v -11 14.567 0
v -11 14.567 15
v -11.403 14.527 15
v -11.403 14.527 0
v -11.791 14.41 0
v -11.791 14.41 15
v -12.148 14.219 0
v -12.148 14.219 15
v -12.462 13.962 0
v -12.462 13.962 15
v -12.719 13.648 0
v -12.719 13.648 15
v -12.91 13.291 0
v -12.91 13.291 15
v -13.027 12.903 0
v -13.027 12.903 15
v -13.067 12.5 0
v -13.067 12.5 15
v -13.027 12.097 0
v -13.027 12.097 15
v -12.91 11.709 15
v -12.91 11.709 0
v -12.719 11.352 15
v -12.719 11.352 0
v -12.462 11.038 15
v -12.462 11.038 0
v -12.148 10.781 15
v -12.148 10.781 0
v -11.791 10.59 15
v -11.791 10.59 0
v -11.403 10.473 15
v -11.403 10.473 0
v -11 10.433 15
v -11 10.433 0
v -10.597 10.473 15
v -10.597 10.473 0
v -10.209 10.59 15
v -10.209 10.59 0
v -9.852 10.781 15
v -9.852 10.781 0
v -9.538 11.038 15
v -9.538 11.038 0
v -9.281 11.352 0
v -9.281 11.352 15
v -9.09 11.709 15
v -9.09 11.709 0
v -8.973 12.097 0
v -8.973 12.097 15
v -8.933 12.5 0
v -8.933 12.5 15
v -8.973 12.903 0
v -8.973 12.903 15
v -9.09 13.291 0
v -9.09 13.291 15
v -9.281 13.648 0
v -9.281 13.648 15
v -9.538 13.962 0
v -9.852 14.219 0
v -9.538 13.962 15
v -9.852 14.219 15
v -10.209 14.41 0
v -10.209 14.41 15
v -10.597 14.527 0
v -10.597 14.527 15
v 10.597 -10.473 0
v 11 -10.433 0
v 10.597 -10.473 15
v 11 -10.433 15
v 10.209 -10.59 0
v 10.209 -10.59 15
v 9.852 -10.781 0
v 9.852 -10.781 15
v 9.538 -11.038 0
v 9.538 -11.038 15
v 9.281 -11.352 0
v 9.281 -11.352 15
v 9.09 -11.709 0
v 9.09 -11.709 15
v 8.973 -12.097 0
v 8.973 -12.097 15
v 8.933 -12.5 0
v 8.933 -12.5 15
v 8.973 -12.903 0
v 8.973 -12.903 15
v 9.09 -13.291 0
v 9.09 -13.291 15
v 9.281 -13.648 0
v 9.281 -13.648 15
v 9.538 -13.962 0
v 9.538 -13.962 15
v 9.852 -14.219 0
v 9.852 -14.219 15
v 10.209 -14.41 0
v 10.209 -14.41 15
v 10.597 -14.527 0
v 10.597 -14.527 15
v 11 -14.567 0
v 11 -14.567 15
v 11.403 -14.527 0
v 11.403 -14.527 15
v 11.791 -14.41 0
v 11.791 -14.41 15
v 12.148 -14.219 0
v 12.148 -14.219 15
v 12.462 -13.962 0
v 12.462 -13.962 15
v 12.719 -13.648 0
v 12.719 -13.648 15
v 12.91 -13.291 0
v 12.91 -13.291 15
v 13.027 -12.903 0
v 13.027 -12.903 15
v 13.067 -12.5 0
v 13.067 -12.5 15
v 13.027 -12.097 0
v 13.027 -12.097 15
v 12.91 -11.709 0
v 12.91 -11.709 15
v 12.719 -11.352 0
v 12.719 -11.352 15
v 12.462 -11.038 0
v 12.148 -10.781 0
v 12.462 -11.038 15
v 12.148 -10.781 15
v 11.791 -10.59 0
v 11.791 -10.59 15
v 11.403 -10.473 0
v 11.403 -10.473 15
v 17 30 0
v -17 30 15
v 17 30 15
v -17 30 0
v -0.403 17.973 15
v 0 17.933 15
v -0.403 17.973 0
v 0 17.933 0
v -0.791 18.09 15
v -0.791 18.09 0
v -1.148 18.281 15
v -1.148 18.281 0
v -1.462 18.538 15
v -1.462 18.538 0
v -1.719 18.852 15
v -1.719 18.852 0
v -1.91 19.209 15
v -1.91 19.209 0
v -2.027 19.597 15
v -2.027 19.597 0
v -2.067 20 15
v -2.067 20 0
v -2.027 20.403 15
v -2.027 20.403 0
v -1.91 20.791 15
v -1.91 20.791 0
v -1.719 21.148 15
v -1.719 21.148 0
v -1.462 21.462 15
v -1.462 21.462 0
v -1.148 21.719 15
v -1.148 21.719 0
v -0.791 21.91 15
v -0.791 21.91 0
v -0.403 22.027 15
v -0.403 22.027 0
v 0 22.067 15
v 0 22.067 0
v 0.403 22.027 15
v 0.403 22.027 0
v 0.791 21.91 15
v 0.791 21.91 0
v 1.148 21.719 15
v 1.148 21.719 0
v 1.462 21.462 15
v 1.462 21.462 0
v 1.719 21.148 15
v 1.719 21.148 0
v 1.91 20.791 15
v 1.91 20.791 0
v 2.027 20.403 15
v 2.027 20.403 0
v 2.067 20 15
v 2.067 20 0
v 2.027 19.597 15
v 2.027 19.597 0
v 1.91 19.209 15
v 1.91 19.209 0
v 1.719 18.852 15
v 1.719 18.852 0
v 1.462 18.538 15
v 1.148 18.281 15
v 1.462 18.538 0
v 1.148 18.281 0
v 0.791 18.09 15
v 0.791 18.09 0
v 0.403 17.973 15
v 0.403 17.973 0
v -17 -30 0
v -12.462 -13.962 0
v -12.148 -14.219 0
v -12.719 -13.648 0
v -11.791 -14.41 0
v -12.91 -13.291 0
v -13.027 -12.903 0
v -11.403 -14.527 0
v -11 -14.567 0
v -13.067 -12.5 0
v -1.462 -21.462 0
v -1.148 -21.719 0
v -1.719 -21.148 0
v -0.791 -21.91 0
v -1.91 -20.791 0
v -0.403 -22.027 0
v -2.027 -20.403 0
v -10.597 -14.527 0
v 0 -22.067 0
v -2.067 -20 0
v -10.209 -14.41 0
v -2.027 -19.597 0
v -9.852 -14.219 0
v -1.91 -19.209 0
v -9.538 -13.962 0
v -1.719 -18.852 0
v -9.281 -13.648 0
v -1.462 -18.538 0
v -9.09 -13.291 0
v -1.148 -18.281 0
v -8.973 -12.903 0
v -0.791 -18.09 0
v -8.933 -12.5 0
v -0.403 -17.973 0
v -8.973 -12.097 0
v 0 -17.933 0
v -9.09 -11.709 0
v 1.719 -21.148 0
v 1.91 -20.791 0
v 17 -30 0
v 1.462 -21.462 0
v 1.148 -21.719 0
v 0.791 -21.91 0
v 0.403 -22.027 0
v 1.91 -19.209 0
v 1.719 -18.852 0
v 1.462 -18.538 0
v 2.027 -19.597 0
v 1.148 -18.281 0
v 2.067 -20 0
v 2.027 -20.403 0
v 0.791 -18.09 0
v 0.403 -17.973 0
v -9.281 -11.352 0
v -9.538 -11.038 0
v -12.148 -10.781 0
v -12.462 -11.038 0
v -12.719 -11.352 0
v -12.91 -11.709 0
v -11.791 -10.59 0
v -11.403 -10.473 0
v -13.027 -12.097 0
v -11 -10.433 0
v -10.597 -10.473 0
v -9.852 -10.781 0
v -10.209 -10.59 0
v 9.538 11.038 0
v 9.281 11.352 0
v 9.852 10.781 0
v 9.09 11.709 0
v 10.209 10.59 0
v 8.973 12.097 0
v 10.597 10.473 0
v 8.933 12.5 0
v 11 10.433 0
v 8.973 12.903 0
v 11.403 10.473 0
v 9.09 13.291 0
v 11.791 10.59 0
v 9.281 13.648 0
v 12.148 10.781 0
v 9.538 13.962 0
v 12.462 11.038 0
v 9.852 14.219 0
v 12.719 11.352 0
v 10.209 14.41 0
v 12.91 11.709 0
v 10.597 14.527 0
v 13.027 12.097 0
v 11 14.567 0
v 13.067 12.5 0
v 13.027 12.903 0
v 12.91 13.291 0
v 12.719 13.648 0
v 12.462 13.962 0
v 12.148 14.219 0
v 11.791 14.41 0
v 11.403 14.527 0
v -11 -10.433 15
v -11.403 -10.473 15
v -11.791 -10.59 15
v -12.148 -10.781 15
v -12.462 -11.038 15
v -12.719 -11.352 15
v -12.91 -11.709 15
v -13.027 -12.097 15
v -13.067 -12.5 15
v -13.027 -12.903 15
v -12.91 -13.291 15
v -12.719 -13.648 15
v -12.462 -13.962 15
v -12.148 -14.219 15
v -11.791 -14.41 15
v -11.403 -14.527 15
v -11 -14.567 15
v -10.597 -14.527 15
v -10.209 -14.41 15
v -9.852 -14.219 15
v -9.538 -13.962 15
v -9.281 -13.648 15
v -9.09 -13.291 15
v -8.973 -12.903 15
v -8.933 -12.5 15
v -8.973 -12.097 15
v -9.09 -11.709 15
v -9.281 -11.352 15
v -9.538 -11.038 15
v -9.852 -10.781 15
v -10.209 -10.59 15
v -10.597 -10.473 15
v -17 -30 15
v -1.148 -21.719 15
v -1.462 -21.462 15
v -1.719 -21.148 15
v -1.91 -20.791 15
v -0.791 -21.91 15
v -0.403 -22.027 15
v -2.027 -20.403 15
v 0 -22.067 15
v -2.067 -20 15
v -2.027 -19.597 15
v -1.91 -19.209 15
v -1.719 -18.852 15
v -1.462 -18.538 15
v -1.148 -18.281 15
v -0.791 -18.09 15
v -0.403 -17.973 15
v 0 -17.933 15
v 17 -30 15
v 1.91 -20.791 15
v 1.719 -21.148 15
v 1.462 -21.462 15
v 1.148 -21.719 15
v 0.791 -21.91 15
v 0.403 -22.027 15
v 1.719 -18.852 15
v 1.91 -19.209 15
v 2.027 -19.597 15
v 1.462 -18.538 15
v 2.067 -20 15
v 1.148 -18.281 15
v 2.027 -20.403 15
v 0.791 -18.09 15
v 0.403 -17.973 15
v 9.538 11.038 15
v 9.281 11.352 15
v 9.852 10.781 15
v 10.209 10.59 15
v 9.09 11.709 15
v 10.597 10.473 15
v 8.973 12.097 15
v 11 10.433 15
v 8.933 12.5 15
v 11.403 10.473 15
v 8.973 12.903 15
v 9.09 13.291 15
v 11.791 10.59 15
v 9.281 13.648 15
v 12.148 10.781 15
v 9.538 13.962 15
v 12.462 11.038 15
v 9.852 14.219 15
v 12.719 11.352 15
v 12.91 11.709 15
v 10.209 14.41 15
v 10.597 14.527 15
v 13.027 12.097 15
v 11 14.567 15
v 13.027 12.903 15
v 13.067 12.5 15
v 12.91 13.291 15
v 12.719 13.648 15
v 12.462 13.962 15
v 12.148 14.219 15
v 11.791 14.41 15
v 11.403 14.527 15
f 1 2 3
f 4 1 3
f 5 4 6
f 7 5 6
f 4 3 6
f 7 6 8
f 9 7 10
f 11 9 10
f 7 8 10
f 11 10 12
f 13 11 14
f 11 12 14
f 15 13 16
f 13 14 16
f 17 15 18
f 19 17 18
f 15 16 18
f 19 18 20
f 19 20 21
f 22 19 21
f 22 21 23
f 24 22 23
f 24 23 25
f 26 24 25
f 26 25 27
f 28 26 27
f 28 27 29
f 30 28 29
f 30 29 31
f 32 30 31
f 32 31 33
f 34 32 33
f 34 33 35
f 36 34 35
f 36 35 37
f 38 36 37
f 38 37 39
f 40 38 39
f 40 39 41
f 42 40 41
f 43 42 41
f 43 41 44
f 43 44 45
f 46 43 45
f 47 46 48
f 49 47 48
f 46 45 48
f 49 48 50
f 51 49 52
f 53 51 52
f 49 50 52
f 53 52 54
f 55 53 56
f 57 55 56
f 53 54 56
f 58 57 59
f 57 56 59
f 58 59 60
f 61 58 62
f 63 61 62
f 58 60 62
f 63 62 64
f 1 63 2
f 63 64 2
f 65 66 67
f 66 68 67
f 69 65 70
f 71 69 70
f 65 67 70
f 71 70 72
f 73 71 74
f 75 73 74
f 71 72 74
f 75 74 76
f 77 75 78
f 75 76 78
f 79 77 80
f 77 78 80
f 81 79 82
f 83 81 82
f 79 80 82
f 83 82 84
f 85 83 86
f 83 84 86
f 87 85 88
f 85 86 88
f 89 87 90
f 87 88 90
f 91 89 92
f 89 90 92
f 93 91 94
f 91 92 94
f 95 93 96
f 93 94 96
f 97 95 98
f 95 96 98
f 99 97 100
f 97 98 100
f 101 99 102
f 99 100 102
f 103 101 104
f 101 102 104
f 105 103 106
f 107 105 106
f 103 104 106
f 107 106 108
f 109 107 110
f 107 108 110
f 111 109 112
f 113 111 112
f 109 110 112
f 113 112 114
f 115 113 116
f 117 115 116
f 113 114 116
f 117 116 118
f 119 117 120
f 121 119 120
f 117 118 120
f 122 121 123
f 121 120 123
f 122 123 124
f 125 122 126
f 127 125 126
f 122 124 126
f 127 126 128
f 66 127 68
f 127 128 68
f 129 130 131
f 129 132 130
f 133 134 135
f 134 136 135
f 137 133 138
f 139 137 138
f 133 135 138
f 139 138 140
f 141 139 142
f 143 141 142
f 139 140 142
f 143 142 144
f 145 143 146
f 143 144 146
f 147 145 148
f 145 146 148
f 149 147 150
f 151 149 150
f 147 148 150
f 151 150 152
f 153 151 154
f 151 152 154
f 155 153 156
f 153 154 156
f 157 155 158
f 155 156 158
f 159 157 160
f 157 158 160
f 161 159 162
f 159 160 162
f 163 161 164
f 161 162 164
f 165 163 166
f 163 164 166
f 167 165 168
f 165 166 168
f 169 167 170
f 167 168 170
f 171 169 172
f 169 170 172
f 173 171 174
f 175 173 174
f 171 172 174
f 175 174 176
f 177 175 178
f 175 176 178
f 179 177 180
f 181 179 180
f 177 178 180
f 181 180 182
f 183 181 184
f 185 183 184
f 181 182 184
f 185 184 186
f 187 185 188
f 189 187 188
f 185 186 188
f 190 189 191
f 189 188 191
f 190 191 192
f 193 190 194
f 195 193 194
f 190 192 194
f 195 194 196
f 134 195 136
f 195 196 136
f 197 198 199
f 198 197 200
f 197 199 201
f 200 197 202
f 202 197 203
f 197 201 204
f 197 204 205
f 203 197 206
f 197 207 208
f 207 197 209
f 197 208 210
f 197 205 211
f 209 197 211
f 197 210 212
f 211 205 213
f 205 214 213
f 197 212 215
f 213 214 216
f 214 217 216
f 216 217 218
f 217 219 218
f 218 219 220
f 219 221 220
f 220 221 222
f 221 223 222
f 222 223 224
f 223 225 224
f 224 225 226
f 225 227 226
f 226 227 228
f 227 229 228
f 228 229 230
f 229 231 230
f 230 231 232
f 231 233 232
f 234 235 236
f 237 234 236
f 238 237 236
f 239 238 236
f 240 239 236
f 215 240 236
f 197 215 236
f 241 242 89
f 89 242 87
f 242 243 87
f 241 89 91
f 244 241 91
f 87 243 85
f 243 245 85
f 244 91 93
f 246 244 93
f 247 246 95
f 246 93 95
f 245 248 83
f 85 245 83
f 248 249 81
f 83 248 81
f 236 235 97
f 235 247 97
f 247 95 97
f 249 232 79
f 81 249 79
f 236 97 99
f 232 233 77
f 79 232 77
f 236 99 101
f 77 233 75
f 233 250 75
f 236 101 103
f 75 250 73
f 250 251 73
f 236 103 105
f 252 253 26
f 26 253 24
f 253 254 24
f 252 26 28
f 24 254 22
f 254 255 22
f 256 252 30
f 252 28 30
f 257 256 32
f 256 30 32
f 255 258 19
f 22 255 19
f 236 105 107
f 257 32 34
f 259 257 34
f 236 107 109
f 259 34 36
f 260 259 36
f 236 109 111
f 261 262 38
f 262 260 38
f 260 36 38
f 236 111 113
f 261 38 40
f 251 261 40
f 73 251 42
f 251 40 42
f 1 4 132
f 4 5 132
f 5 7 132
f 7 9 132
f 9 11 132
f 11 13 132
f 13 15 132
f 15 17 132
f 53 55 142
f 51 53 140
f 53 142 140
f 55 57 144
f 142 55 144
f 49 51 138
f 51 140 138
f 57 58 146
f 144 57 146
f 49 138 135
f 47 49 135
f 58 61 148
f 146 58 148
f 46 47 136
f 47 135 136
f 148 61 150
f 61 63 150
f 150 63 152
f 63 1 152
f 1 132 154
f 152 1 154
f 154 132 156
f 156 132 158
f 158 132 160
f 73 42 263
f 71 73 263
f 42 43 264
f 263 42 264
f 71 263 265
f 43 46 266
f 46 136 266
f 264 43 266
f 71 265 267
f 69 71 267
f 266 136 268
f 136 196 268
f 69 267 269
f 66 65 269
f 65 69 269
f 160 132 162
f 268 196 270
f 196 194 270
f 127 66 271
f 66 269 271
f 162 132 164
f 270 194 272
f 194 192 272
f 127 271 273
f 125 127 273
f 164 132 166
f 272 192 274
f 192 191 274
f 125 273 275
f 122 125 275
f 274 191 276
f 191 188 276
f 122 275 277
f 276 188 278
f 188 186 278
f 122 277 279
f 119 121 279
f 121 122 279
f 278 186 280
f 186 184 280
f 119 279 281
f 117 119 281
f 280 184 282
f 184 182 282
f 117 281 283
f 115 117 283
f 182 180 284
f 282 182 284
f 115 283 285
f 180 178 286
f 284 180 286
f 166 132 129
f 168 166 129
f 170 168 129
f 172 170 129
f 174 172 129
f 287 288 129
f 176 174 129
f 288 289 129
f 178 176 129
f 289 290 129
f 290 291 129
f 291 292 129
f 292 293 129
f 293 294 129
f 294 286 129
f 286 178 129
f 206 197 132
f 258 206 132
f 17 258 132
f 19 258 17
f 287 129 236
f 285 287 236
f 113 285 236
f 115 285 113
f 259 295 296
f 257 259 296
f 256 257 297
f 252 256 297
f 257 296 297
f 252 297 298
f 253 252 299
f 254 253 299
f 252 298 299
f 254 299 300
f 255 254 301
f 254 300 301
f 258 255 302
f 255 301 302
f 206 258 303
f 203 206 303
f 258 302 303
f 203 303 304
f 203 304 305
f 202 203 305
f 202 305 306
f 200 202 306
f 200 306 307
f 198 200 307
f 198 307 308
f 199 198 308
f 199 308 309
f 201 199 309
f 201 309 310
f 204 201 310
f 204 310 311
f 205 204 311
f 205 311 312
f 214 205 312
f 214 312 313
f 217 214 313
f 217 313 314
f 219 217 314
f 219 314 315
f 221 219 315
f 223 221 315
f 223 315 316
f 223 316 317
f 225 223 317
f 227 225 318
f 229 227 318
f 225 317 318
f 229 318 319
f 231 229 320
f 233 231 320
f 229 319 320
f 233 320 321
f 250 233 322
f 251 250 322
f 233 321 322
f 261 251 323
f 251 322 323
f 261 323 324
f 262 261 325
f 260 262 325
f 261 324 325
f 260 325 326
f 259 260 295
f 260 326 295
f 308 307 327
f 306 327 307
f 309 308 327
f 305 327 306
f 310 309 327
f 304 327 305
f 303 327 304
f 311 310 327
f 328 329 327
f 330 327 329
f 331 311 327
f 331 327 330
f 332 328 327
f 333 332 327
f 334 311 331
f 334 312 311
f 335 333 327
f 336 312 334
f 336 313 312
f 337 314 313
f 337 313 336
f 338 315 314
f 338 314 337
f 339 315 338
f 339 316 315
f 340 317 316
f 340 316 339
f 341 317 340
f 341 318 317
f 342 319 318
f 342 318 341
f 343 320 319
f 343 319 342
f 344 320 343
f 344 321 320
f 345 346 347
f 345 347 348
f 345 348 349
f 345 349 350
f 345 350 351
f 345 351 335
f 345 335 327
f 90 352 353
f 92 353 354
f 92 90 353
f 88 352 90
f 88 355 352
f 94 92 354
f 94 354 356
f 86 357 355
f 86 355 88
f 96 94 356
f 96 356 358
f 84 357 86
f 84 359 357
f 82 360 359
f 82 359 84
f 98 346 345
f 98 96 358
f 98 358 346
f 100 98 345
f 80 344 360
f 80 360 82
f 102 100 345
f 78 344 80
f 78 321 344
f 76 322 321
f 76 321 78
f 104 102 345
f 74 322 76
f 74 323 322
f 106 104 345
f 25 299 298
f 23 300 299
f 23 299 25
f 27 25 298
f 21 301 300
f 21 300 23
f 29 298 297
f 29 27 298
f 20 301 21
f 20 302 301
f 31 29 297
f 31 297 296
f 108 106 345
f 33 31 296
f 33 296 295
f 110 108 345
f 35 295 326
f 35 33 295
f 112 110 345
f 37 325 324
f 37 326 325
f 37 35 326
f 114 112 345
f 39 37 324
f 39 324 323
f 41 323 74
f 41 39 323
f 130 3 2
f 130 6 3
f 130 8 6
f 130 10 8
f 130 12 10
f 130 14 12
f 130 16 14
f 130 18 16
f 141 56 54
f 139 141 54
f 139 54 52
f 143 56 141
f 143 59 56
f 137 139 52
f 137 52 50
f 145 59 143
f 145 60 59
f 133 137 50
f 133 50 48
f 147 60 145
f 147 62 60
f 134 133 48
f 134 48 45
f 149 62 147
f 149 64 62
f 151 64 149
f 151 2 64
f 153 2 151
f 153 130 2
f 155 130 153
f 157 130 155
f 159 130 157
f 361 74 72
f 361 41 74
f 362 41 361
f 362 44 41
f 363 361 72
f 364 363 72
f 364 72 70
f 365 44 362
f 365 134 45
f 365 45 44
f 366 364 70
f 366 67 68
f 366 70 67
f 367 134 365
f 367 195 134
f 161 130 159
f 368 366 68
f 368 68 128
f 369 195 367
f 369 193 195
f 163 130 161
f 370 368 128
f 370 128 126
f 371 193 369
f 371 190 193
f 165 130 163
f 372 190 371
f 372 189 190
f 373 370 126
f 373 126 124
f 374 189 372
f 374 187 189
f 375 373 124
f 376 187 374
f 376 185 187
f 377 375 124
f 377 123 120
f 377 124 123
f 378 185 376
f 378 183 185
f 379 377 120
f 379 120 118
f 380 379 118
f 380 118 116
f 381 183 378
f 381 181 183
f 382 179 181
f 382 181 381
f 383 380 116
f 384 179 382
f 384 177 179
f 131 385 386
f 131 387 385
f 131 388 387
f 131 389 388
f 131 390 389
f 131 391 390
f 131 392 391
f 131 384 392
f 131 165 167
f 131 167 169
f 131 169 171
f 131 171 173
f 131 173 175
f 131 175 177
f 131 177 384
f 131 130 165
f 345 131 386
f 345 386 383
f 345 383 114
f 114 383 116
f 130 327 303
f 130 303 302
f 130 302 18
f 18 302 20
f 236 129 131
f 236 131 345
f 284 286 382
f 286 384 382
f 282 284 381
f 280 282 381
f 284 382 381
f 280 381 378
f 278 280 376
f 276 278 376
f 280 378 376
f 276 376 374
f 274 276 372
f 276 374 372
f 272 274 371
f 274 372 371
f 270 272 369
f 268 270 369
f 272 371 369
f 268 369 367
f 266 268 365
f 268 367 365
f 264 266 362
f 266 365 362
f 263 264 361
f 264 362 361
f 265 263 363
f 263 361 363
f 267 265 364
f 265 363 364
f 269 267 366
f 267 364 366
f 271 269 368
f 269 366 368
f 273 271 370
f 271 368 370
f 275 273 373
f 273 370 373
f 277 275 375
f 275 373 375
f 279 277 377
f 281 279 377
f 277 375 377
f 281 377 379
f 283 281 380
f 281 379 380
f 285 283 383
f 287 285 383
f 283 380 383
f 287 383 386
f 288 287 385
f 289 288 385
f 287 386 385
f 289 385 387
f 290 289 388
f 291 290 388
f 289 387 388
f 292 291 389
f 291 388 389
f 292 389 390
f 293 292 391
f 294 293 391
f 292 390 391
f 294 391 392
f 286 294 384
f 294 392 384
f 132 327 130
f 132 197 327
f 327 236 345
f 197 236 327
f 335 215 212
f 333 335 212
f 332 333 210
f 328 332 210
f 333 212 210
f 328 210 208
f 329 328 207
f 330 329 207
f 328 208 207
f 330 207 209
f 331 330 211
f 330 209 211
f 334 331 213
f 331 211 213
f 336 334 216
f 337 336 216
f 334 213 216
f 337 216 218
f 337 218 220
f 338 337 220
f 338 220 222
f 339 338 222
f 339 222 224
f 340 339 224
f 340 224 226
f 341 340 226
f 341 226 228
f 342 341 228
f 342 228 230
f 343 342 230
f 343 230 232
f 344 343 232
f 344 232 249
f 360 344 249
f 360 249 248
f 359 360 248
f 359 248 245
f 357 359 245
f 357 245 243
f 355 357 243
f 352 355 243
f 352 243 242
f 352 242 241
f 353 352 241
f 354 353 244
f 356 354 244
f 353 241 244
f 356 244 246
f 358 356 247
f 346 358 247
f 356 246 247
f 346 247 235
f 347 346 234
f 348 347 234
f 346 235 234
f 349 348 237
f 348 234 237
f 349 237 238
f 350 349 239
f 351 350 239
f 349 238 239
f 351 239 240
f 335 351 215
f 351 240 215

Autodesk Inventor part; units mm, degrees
ref_plane "YZ Plane" through (0, 0, 0) normal (1, 0, 0) x (0, 1, 0)
ref_plane "XZ Plane" through (0, 0, 0) normal (0, 1, 0) x (-1, 0, 0)
ref_plane "XY Plane" through (0, 0, 0) normal (0, 0, 1) x (1, 0, 0)
sketch "Skizze1" plane through (0, 0, 0) normal (0, 0, 1) x (1, 0, 0)
  line L0 (-17, 30) -> (17, 30)
  line L1 (17, 30) -> (17, -30)
  line L2 (17, -30) -> (-17, -30)
  line L3 (-17, -30) -> (-17, 30)
  line L4 (-23.8, 0) -> (23.8, 0) projected
  line L5 (0, -42) -> (0, 42) projected
  point P0 (0, 0)
  dimension "d0" = 34
  dimension "d1" = 60
extrude "Extrusion1" add sketch "Skizze1" along normal blind 15
sketch "Skizze2" plane through (0, 0, 0) normal (0, 0, -1) x (-1, 0, 0)
  line L0 (23.8, 0) -> (-23.8, 0) projected
  line L1 (0, -42) -> (0, 42) projected
  line L2 (11, 12.5) -> (-11, 12.5)
  line L3 (-11, 12.5) -> (-11, -12.5)
  line L4 (-11, -12.5) -> (11, -12.5)
  line L5 (11, -12.5) -> (11, 12.5)
  point P0 (0, 0)
  dimension "d4" = 22
  dimension "d5" = 25
hole "Bohrung1" at (-11, 12.5, 0) at (-11, -12.5, 0) at (11, -12.5, 0) at (11, 12.5, 0) direction (0, 0, 1) diameter 4.134 end through all thread size "M5x0.8" class "6H" standard "ISO Metric profile"
sketch "Skizze3" plane through (0, 0, 15) normal (0, 0, 1) x (1, 0, 0)
  circle A0 centre (0, 20) radius 2.75 projected
  circle A1 centre (0, -20) radius 2.75 projected
  point P0 (0, 0)
hole "Bohrung2" at (0, 20, 15) at (0, -20, 15) direction (0, 0, -1) diameter 4.134 end through all thread size "M5x0.8" class "6H" standard "ISO Metric profile"
properties part number "1_0204_011"
